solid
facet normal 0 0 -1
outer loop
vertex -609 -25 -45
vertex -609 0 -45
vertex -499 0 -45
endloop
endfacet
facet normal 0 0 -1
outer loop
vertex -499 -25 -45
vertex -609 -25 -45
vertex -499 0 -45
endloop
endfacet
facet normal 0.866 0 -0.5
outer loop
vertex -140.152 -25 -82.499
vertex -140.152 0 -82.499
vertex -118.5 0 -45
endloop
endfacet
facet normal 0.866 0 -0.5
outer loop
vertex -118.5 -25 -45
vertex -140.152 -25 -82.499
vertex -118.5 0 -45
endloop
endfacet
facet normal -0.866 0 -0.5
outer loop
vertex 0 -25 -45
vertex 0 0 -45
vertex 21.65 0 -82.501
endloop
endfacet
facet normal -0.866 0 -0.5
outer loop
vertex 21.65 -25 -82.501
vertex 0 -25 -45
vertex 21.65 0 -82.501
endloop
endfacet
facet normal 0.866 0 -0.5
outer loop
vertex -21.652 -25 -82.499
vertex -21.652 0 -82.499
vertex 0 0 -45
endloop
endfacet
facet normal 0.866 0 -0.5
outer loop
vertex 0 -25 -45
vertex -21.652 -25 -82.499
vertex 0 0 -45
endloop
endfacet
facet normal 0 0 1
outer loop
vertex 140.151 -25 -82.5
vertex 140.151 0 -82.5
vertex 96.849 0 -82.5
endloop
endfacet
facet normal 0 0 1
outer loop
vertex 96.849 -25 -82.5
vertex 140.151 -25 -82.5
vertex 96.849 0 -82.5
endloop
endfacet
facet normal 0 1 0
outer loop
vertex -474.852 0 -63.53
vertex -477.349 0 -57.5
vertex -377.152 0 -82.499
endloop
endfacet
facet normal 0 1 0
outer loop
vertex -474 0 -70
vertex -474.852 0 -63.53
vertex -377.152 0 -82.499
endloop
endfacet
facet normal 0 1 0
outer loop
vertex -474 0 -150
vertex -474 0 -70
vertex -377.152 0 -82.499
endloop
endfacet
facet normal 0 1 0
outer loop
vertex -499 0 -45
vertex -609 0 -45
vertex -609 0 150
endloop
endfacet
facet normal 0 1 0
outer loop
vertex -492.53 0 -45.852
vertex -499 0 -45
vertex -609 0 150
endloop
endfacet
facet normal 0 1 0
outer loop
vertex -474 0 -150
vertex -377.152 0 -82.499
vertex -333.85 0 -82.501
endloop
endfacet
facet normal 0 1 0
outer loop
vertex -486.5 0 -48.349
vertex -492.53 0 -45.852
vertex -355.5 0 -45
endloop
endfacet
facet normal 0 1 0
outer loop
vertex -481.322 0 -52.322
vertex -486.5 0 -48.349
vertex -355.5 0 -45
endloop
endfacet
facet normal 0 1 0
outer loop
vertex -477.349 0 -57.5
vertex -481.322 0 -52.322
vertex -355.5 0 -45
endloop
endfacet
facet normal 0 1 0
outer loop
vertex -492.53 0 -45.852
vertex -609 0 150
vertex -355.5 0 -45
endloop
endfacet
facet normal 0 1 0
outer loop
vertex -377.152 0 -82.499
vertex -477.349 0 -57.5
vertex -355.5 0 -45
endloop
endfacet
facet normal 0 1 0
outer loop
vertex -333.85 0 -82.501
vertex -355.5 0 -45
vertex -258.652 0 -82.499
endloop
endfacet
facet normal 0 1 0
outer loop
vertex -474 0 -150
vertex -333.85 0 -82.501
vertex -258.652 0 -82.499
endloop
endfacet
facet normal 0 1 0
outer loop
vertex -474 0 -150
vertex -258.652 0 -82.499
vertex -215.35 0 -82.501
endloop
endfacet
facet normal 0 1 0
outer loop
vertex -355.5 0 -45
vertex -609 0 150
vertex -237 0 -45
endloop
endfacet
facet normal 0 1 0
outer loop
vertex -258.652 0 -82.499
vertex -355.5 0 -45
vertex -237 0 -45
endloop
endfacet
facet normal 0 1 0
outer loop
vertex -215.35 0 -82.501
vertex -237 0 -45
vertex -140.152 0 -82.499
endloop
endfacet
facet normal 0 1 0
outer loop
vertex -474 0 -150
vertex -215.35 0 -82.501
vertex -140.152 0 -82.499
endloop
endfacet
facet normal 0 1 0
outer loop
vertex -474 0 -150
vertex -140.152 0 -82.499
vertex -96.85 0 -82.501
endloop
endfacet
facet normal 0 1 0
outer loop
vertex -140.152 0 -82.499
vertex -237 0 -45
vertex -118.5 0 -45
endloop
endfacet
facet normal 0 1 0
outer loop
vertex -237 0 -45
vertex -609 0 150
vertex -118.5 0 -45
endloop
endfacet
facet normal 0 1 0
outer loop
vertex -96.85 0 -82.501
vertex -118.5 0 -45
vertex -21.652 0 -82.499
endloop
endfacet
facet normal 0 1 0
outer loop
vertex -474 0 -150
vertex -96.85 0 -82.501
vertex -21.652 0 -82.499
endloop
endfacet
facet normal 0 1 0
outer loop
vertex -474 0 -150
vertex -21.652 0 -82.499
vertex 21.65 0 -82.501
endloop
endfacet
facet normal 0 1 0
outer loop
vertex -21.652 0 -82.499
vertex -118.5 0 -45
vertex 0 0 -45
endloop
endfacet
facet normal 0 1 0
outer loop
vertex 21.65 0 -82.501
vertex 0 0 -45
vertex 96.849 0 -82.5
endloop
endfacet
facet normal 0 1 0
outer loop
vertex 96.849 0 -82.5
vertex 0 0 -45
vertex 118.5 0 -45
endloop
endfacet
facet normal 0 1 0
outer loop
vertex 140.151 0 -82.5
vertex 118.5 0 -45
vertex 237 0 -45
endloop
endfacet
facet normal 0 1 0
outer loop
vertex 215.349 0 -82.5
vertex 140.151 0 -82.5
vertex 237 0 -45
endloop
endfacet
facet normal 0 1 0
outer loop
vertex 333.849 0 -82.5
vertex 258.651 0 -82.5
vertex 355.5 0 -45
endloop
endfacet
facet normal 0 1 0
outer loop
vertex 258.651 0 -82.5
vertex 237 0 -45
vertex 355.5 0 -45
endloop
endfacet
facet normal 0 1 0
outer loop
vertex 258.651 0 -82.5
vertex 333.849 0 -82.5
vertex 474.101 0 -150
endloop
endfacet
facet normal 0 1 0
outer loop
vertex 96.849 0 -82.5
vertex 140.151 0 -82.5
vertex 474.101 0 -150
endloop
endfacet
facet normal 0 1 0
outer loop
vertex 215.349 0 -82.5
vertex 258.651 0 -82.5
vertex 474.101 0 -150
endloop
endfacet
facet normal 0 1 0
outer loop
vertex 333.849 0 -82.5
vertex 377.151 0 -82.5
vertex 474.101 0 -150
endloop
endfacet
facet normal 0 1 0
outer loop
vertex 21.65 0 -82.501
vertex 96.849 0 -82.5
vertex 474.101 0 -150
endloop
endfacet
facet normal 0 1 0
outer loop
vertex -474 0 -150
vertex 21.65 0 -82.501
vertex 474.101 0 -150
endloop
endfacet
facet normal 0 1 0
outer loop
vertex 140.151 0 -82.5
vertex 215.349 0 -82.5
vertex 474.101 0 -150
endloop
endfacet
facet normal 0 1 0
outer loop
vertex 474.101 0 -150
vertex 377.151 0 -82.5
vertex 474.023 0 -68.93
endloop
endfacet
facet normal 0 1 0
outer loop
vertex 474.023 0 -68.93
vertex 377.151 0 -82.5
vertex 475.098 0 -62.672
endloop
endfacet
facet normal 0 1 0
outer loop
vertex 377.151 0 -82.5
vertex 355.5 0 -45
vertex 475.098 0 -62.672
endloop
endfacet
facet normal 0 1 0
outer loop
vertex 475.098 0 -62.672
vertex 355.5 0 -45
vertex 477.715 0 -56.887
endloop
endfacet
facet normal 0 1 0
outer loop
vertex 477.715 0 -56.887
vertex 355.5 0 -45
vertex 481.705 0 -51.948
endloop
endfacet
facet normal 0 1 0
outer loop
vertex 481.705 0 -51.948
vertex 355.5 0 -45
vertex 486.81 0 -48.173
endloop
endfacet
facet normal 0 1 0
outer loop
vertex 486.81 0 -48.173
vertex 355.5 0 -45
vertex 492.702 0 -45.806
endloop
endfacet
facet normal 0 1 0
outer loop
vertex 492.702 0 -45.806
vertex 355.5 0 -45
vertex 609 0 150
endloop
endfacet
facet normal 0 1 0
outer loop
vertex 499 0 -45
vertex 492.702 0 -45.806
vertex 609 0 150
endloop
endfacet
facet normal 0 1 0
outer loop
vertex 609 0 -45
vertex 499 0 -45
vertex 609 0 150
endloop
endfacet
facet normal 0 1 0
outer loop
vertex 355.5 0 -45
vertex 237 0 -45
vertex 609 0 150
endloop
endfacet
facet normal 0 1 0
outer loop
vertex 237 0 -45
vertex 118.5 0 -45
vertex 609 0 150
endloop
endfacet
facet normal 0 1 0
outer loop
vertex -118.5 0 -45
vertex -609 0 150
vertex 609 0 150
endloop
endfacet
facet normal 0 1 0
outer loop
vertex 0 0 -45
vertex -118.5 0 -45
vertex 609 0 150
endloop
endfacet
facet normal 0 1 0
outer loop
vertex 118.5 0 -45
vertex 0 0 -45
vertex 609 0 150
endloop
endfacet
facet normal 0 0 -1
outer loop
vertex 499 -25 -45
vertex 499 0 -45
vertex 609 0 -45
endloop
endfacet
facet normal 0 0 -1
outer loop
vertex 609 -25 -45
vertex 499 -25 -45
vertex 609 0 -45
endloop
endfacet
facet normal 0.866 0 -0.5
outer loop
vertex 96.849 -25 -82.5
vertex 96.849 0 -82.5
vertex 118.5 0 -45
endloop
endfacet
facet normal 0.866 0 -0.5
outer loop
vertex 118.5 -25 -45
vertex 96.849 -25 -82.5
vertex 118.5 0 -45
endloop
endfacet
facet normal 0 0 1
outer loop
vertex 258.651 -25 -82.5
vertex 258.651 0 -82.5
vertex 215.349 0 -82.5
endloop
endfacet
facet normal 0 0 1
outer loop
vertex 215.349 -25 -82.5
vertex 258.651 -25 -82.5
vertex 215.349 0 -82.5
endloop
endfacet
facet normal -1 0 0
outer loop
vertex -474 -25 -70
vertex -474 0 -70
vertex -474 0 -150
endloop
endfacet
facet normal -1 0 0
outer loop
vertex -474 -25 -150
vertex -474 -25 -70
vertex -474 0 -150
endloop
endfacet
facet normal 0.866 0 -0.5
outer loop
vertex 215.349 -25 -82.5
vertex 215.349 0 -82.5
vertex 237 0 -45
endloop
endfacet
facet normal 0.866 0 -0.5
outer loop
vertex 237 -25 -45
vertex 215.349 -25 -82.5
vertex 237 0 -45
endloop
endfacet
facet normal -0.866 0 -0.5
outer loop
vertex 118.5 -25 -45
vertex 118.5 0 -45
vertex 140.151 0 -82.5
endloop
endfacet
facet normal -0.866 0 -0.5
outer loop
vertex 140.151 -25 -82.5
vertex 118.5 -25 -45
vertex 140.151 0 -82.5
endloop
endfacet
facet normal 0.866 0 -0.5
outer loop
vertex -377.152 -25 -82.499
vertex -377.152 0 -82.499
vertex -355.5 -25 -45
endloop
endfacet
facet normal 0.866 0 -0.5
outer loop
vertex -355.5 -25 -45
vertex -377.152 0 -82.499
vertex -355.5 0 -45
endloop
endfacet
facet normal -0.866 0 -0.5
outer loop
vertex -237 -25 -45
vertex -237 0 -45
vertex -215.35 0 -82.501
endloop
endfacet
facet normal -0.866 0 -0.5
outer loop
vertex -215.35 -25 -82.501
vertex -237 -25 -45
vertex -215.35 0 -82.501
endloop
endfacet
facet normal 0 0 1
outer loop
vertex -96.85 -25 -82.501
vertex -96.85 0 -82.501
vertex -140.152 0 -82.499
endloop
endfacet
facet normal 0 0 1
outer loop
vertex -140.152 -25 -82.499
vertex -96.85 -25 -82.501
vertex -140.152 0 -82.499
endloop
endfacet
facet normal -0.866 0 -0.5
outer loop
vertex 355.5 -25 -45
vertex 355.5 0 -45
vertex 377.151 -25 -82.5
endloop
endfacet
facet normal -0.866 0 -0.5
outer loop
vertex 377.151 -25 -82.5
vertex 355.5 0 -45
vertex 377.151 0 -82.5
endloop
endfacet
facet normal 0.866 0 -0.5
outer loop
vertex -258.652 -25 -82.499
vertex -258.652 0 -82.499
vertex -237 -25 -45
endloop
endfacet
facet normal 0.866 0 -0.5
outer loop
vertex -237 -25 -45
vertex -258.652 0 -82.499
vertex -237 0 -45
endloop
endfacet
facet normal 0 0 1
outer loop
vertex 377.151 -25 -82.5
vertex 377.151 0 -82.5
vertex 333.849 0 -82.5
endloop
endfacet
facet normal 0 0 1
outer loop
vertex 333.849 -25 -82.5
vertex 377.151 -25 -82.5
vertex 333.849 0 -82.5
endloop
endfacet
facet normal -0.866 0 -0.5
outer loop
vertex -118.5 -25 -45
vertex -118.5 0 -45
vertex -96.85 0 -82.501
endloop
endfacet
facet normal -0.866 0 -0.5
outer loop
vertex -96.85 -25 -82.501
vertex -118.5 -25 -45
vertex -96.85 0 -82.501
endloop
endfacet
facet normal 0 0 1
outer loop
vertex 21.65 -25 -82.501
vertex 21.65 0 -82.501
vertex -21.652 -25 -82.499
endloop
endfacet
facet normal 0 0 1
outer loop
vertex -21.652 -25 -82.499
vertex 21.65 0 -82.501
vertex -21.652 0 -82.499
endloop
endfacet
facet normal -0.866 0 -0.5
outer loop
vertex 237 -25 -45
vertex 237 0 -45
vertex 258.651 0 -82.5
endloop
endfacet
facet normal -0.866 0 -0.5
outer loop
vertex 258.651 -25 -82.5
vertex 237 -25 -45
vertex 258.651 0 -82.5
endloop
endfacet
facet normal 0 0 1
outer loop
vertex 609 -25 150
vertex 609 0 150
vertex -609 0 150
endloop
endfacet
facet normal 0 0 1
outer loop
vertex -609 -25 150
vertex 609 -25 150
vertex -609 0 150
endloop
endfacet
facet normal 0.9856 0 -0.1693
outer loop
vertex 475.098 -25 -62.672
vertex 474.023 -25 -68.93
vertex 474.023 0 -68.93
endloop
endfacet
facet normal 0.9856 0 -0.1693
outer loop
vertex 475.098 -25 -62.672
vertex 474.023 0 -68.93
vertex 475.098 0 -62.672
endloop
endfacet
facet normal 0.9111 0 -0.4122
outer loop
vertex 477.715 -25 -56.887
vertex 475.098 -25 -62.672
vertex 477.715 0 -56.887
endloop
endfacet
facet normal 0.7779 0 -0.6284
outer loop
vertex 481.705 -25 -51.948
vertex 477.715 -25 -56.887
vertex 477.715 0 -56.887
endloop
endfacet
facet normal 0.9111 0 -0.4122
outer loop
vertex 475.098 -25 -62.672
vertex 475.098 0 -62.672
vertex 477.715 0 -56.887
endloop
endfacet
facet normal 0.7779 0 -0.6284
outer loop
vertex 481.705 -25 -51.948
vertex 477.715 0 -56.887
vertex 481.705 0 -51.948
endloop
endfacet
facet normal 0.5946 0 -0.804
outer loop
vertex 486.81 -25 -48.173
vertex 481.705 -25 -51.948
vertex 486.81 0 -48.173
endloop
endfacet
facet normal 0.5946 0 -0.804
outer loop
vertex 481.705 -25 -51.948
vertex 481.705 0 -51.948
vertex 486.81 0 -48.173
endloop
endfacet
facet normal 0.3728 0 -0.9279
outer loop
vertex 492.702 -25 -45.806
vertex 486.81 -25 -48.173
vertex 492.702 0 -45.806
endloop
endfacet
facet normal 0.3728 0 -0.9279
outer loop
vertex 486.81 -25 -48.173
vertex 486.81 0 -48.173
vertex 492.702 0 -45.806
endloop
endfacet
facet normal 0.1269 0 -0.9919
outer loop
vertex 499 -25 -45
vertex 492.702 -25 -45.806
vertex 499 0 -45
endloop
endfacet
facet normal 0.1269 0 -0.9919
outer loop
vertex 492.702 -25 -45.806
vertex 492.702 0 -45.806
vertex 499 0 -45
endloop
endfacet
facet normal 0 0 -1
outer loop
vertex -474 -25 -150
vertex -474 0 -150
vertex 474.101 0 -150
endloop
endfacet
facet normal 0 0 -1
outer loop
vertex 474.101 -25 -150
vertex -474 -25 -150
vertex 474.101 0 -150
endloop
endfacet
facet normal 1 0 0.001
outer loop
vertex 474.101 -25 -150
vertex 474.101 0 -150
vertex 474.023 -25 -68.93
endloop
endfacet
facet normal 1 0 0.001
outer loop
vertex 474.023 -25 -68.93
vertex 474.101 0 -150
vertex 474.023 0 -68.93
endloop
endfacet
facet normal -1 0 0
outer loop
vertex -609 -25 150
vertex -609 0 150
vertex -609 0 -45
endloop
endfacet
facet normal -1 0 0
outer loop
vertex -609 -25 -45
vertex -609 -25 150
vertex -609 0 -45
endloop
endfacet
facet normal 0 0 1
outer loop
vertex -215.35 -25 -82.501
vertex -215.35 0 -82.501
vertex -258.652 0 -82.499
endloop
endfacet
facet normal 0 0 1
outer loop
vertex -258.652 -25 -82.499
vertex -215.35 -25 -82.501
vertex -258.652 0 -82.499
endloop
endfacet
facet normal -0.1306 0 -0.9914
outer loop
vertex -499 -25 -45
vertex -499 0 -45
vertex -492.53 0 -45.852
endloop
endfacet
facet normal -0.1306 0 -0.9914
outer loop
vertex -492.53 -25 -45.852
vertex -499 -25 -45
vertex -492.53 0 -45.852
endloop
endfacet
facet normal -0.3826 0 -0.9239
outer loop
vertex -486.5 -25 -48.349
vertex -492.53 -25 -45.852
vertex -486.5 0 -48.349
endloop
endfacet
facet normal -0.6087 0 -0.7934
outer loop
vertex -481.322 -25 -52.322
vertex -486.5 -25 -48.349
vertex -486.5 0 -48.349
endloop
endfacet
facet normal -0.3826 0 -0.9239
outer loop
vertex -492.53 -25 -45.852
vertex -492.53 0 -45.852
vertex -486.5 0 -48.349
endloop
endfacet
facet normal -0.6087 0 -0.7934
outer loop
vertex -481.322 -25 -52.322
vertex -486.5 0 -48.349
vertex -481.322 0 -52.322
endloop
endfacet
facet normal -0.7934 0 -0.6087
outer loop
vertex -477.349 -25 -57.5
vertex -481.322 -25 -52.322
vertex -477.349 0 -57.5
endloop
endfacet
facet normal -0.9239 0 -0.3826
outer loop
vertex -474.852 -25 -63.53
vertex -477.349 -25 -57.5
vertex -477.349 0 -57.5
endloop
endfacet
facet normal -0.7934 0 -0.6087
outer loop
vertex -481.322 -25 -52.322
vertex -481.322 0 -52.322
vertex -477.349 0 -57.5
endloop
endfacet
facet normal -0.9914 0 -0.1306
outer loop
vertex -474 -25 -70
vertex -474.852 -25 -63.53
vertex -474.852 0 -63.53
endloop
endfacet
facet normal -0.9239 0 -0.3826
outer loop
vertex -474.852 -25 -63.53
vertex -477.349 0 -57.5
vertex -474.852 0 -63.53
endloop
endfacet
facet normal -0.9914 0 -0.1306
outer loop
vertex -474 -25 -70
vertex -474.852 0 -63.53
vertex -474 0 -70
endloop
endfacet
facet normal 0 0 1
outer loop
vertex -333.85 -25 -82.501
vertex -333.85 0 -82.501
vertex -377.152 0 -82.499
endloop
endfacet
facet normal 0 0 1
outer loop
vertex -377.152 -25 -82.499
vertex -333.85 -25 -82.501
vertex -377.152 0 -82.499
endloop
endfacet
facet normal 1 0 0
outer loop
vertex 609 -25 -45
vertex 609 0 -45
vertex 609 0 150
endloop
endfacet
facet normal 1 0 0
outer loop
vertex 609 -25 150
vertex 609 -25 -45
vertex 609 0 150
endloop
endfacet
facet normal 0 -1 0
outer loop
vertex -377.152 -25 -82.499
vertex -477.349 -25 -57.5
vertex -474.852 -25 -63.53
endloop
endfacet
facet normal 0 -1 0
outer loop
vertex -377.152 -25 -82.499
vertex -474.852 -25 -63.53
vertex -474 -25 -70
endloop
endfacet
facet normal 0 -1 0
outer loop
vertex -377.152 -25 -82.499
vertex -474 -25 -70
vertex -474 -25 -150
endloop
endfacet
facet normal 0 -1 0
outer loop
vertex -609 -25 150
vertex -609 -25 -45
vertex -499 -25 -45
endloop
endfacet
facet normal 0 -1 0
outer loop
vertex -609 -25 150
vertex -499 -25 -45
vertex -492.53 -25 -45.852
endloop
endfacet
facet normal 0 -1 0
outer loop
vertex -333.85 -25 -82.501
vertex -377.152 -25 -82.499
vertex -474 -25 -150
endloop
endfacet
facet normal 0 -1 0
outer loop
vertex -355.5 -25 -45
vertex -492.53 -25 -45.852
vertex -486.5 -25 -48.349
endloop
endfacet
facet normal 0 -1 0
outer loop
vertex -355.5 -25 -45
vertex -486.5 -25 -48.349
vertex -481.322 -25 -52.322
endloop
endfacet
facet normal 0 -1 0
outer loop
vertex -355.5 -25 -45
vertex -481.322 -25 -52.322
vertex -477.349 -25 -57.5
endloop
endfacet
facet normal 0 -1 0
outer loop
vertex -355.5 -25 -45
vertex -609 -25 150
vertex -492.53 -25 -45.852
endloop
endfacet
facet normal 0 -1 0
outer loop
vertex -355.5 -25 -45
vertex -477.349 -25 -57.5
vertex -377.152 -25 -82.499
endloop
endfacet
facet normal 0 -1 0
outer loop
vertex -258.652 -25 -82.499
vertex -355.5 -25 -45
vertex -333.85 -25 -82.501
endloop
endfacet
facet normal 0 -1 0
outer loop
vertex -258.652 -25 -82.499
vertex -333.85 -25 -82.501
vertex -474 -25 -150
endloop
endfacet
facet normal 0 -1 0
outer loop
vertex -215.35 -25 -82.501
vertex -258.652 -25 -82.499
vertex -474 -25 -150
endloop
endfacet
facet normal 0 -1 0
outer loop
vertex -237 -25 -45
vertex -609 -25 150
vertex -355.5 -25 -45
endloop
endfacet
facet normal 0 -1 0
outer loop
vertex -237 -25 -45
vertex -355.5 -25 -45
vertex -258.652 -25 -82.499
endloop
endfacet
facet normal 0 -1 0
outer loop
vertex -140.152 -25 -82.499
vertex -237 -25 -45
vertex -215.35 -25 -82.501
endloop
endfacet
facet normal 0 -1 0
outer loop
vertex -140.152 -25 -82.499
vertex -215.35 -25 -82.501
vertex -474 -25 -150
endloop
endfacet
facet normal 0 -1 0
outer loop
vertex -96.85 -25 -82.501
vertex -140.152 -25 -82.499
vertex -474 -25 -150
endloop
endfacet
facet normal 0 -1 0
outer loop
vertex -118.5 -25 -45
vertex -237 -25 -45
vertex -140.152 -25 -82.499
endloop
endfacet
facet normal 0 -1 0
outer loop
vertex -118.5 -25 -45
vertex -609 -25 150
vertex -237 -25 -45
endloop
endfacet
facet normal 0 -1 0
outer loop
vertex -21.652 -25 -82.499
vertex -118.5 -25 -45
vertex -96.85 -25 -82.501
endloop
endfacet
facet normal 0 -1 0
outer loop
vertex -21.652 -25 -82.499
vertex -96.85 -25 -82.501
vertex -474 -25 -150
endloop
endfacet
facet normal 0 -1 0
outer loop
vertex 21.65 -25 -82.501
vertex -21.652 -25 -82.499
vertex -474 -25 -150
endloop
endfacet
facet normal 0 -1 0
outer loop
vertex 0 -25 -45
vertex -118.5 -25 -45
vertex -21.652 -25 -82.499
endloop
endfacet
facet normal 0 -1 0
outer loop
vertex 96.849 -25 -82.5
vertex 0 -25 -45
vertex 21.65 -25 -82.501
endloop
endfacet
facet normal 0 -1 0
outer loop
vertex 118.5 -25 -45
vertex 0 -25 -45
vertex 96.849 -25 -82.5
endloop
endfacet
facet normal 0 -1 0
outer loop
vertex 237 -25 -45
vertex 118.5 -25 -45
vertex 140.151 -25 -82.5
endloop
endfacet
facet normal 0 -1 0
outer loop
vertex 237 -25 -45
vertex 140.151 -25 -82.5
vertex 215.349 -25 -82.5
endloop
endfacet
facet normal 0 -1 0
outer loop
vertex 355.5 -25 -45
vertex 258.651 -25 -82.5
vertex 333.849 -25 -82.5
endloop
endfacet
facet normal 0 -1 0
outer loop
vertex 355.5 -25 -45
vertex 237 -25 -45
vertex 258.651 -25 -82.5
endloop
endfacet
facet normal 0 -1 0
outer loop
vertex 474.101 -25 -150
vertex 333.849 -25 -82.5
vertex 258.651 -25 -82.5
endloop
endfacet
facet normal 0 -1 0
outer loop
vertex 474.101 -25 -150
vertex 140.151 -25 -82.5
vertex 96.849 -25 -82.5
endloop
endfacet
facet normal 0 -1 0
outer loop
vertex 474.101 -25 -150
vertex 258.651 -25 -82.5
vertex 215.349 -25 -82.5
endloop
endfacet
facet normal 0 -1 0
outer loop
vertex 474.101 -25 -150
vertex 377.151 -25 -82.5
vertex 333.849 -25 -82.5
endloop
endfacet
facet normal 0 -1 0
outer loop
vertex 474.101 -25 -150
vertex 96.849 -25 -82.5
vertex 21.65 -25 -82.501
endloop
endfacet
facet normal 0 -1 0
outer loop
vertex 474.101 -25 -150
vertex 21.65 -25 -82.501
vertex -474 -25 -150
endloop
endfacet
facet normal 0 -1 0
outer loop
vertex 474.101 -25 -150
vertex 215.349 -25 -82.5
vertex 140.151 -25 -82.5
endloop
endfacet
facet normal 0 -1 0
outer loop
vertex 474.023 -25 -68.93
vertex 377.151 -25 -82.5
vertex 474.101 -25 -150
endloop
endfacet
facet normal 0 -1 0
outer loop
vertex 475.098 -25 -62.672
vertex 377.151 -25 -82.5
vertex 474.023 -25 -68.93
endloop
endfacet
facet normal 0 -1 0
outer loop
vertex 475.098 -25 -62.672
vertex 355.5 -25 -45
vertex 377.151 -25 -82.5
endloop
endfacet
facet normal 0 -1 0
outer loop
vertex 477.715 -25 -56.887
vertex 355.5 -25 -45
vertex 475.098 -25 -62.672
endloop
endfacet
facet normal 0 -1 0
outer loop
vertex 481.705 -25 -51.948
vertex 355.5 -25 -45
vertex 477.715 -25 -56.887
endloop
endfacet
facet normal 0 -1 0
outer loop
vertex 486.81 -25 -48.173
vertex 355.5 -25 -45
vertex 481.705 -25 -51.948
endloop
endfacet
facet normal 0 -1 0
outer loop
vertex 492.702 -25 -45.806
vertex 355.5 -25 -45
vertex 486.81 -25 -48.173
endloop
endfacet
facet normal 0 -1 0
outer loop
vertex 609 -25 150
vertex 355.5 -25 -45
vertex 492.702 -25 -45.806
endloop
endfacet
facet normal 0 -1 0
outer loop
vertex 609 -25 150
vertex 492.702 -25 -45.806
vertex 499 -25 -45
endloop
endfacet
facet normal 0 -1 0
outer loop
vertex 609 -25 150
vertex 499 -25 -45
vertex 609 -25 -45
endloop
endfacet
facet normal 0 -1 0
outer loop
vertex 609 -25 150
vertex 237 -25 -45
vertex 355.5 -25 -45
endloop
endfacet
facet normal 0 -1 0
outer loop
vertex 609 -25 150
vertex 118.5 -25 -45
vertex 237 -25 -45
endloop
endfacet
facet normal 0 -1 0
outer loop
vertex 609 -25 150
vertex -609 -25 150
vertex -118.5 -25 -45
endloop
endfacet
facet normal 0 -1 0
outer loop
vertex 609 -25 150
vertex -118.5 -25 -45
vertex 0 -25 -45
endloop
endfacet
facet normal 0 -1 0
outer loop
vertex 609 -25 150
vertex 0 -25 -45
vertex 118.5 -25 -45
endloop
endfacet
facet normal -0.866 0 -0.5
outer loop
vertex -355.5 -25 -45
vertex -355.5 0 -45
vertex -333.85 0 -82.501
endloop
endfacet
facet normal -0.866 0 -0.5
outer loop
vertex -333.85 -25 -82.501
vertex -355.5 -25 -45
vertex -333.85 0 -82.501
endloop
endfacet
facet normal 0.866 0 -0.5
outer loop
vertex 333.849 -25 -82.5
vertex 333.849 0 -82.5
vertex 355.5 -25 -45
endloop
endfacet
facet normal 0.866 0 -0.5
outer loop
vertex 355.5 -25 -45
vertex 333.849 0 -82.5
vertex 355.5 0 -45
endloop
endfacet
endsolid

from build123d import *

# Parameters (mm, degrees)
F1_DEPTH = 25


# Not quite as in the source:
# - a feature names something its author has since deleted; it is built from what else it names


with BuildPart() as f1:
    # F0 (on Front) → F1 (new body)
    with BuildSketch(Plane.XZ):
        with BuildLine():
            Line((609, -45), (609, 150))
            Line((609, 150), (-609, 150))
            Line((-609, 150), (-609, -45))
            Line((-609, -45), (-499, -45))
            ThreePointArc((-499, -45), (-481.3223304703, -52.3223304703), (-474, -70))
            Line((-474, -70), (-474, -150))
            Line((-474, -150), (474.1005301476, -150))
            Line((474.1005301476, -150), (474.0229112381, -68.9299359934))
            ThreePointArc((474.0229112381, -68.9299359934), (481.7047925737, -51.947969641), (499, -45))
            Line((499, -45), (609, -45))
        make_face()
        Polygon((-377.1515345675, -82.4994803672), (-355.4999994674, -45), (-333.8502643907, -82.5005196112), align=None, mode=Mode.SUBTRACT)
        Polygon((-258.6515341126, -82.4994803672), (-236.9999990125, -45), (-215.3502639358, -82.5005196112), align=None, mode=Mode.SUBTRACT)
        Polygon((-140.1515340625, -82.4994803672), (-118.4999989624, -45), (-96.8502638857, -82.5005196112), align=None, mode=Mode.SUBTRACT)
        Polygon((-21.651534291, -82.4994803674), (8.087e-07, -45), (21.6497358858, -82.500519611), align=None, mode=Mode.SUBTRACT)
        Polygon((96.8493649054, -82.5), (118.5, -45), (140.1506350946, -82.5), align=None, mode=Mode.SUBTRACT)
        Polygon((215.3493649054, -82.5), (237, -45), (258.6506350946, -82.5), align=None, mode=Mode.SUBTRACT)
        Polygon((333.8493649054, -82.5), (355.5, -45), (377.1506350946, -82.5), align=None, mode=Mode.SUBTRACT)
    extrude(amount=F1_DEPTH)


solid = f1.part
